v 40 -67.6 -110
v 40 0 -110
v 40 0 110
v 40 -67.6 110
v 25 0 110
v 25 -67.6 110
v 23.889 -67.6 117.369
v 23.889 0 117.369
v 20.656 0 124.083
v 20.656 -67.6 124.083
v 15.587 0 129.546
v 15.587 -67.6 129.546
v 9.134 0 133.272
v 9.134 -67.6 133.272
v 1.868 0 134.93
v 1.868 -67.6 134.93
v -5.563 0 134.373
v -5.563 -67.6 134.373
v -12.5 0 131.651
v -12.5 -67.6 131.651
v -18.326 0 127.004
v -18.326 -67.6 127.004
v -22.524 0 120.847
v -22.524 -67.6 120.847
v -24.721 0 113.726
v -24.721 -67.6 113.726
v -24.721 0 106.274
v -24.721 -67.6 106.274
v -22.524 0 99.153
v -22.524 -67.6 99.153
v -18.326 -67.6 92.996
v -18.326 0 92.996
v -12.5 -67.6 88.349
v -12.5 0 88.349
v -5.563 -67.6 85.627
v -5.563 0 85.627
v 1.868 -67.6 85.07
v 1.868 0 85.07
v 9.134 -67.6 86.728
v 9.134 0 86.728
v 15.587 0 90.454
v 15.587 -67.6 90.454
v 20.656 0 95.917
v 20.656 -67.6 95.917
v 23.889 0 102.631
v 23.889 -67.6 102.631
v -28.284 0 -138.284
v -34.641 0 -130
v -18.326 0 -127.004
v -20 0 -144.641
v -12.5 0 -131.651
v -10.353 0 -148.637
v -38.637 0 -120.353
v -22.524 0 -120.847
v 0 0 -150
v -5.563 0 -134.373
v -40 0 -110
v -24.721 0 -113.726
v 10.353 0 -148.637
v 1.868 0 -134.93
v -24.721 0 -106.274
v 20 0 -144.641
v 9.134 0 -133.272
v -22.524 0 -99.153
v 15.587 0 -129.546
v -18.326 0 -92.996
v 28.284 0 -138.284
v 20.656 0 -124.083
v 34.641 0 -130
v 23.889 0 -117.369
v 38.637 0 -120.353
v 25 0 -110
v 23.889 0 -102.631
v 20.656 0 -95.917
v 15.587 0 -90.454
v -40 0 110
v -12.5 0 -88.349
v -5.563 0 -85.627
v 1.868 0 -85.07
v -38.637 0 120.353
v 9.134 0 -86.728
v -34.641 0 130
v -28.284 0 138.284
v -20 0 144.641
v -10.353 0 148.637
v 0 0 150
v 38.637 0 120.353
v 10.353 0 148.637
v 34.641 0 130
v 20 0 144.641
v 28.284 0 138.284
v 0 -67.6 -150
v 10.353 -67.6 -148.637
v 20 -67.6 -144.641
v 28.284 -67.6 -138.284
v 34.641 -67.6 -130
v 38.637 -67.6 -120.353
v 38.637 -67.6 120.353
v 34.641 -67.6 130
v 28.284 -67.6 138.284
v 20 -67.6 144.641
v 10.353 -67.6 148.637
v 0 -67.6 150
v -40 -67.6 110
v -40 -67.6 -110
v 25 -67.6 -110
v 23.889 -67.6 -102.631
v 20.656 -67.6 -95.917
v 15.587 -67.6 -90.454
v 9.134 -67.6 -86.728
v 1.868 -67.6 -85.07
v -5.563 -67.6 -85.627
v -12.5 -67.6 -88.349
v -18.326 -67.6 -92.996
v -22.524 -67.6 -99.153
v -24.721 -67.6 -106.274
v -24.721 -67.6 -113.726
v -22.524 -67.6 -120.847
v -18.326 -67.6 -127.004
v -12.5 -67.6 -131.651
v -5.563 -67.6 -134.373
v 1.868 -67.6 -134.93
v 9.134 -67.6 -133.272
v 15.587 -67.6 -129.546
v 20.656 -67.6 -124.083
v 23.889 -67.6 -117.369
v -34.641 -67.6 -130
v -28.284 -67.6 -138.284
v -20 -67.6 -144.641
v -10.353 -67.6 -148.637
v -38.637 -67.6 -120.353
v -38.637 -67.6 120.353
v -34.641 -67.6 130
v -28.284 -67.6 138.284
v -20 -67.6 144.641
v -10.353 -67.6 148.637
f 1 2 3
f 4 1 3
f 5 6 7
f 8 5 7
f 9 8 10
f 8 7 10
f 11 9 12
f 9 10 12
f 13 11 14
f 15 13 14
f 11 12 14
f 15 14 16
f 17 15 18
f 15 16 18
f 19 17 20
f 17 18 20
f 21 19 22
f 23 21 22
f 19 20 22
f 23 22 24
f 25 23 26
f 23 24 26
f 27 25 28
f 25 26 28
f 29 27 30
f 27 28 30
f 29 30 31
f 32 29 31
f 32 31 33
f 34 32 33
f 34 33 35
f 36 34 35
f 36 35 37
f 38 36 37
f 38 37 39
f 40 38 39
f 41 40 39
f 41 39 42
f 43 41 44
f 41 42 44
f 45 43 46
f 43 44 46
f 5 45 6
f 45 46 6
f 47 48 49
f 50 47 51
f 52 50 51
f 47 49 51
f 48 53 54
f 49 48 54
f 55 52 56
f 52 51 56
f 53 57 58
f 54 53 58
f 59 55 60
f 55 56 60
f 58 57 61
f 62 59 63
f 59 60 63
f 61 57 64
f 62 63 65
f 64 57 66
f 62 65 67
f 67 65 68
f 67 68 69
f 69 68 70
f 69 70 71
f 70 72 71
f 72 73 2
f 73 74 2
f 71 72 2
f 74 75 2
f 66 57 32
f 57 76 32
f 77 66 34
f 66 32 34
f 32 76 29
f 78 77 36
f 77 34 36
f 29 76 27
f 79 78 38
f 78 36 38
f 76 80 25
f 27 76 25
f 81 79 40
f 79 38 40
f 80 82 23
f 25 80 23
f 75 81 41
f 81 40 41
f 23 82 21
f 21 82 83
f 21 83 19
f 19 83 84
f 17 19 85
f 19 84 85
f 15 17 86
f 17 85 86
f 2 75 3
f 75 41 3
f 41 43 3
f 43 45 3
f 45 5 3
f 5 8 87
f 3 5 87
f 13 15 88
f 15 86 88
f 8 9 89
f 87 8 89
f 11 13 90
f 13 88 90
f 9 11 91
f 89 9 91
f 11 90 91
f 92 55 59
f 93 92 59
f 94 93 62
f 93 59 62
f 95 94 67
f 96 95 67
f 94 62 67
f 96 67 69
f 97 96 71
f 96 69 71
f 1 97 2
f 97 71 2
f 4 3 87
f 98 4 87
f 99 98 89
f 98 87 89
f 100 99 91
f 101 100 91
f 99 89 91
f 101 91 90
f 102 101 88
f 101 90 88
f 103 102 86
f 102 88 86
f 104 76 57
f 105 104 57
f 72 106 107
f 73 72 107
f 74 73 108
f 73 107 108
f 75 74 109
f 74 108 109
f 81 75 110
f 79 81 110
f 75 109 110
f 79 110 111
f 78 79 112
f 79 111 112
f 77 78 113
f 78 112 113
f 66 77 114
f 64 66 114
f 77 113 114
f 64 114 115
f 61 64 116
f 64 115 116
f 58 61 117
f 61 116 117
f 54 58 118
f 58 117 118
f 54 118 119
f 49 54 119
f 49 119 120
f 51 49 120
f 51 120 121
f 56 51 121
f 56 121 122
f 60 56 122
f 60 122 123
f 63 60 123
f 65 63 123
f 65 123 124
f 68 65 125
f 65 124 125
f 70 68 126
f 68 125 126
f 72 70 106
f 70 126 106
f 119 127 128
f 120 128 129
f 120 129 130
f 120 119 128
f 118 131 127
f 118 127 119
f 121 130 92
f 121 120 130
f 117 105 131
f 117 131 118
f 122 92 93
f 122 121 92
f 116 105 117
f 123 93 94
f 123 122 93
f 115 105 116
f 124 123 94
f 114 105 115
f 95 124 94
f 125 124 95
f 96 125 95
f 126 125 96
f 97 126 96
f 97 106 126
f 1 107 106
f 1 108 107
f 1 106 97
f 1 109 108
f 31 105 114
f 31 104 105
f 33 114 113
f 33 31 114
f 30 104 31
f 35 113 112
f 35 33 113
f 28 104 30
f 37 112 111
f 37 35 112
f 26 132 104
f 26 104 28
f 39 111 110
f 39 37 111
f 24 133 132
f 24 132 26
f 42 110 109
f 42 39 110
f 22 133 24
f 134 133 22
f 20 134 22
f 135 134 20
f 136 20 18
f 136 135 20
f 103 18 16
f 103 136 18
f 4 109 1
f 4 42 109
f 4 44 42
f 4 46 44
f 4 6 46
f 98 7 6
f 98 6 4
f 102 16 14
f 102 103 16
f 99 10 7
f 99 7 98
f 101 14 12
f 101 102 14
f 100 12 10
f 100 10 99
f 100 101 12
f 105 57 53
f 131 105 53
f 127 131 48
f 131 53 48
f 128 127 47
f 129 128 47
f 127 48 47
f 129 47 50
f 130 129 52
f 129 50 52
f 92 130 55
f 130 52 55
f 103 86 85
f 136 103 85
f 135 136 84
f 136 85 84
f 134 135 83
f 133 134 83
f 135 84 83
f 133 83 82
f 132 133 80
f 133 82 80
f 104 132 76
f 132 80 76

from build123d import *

# Parameters (mm, degrees)
F1_DEPTH = 67.6
F2_R     = 25
F3_DEPTH = 67.6


with BuildPart() as f1:
    # F0 (on Front) → F1 (new body)
    with BuildSketch(Plane.XZ):
        with BuildLine():
            Line((40, -110), (40, 110))
            ThreePointArc((40, 110), (28.284271, 138.284271), (0, 150))
            ThreePointArc((0, 150), (-28.284271, 138.284271), (-40, 110))
            Line((-40, 110), (-40, -110))
            ThreePointArc((-40, -110), (-28.284271, -138.284271), (0, -150))
            ThreePointArc((0, -150), (28.284271, -138.284271), (40, -110))
        make_face()
    extrude(amount=F1_DEPTH)

    # F2 (on face) → F3 (cut, through all)
    with BuildSketch(Plane.XZ.offset(67.6)):
        with Locations((0, 110)):
            Circle(F2_R)
        with Locations((0, -110)):
            Circle(F2_R)
    extrude(amount=-F3_DEPTH, mode=Mode.SUBTRACT)


solid = f1.part
